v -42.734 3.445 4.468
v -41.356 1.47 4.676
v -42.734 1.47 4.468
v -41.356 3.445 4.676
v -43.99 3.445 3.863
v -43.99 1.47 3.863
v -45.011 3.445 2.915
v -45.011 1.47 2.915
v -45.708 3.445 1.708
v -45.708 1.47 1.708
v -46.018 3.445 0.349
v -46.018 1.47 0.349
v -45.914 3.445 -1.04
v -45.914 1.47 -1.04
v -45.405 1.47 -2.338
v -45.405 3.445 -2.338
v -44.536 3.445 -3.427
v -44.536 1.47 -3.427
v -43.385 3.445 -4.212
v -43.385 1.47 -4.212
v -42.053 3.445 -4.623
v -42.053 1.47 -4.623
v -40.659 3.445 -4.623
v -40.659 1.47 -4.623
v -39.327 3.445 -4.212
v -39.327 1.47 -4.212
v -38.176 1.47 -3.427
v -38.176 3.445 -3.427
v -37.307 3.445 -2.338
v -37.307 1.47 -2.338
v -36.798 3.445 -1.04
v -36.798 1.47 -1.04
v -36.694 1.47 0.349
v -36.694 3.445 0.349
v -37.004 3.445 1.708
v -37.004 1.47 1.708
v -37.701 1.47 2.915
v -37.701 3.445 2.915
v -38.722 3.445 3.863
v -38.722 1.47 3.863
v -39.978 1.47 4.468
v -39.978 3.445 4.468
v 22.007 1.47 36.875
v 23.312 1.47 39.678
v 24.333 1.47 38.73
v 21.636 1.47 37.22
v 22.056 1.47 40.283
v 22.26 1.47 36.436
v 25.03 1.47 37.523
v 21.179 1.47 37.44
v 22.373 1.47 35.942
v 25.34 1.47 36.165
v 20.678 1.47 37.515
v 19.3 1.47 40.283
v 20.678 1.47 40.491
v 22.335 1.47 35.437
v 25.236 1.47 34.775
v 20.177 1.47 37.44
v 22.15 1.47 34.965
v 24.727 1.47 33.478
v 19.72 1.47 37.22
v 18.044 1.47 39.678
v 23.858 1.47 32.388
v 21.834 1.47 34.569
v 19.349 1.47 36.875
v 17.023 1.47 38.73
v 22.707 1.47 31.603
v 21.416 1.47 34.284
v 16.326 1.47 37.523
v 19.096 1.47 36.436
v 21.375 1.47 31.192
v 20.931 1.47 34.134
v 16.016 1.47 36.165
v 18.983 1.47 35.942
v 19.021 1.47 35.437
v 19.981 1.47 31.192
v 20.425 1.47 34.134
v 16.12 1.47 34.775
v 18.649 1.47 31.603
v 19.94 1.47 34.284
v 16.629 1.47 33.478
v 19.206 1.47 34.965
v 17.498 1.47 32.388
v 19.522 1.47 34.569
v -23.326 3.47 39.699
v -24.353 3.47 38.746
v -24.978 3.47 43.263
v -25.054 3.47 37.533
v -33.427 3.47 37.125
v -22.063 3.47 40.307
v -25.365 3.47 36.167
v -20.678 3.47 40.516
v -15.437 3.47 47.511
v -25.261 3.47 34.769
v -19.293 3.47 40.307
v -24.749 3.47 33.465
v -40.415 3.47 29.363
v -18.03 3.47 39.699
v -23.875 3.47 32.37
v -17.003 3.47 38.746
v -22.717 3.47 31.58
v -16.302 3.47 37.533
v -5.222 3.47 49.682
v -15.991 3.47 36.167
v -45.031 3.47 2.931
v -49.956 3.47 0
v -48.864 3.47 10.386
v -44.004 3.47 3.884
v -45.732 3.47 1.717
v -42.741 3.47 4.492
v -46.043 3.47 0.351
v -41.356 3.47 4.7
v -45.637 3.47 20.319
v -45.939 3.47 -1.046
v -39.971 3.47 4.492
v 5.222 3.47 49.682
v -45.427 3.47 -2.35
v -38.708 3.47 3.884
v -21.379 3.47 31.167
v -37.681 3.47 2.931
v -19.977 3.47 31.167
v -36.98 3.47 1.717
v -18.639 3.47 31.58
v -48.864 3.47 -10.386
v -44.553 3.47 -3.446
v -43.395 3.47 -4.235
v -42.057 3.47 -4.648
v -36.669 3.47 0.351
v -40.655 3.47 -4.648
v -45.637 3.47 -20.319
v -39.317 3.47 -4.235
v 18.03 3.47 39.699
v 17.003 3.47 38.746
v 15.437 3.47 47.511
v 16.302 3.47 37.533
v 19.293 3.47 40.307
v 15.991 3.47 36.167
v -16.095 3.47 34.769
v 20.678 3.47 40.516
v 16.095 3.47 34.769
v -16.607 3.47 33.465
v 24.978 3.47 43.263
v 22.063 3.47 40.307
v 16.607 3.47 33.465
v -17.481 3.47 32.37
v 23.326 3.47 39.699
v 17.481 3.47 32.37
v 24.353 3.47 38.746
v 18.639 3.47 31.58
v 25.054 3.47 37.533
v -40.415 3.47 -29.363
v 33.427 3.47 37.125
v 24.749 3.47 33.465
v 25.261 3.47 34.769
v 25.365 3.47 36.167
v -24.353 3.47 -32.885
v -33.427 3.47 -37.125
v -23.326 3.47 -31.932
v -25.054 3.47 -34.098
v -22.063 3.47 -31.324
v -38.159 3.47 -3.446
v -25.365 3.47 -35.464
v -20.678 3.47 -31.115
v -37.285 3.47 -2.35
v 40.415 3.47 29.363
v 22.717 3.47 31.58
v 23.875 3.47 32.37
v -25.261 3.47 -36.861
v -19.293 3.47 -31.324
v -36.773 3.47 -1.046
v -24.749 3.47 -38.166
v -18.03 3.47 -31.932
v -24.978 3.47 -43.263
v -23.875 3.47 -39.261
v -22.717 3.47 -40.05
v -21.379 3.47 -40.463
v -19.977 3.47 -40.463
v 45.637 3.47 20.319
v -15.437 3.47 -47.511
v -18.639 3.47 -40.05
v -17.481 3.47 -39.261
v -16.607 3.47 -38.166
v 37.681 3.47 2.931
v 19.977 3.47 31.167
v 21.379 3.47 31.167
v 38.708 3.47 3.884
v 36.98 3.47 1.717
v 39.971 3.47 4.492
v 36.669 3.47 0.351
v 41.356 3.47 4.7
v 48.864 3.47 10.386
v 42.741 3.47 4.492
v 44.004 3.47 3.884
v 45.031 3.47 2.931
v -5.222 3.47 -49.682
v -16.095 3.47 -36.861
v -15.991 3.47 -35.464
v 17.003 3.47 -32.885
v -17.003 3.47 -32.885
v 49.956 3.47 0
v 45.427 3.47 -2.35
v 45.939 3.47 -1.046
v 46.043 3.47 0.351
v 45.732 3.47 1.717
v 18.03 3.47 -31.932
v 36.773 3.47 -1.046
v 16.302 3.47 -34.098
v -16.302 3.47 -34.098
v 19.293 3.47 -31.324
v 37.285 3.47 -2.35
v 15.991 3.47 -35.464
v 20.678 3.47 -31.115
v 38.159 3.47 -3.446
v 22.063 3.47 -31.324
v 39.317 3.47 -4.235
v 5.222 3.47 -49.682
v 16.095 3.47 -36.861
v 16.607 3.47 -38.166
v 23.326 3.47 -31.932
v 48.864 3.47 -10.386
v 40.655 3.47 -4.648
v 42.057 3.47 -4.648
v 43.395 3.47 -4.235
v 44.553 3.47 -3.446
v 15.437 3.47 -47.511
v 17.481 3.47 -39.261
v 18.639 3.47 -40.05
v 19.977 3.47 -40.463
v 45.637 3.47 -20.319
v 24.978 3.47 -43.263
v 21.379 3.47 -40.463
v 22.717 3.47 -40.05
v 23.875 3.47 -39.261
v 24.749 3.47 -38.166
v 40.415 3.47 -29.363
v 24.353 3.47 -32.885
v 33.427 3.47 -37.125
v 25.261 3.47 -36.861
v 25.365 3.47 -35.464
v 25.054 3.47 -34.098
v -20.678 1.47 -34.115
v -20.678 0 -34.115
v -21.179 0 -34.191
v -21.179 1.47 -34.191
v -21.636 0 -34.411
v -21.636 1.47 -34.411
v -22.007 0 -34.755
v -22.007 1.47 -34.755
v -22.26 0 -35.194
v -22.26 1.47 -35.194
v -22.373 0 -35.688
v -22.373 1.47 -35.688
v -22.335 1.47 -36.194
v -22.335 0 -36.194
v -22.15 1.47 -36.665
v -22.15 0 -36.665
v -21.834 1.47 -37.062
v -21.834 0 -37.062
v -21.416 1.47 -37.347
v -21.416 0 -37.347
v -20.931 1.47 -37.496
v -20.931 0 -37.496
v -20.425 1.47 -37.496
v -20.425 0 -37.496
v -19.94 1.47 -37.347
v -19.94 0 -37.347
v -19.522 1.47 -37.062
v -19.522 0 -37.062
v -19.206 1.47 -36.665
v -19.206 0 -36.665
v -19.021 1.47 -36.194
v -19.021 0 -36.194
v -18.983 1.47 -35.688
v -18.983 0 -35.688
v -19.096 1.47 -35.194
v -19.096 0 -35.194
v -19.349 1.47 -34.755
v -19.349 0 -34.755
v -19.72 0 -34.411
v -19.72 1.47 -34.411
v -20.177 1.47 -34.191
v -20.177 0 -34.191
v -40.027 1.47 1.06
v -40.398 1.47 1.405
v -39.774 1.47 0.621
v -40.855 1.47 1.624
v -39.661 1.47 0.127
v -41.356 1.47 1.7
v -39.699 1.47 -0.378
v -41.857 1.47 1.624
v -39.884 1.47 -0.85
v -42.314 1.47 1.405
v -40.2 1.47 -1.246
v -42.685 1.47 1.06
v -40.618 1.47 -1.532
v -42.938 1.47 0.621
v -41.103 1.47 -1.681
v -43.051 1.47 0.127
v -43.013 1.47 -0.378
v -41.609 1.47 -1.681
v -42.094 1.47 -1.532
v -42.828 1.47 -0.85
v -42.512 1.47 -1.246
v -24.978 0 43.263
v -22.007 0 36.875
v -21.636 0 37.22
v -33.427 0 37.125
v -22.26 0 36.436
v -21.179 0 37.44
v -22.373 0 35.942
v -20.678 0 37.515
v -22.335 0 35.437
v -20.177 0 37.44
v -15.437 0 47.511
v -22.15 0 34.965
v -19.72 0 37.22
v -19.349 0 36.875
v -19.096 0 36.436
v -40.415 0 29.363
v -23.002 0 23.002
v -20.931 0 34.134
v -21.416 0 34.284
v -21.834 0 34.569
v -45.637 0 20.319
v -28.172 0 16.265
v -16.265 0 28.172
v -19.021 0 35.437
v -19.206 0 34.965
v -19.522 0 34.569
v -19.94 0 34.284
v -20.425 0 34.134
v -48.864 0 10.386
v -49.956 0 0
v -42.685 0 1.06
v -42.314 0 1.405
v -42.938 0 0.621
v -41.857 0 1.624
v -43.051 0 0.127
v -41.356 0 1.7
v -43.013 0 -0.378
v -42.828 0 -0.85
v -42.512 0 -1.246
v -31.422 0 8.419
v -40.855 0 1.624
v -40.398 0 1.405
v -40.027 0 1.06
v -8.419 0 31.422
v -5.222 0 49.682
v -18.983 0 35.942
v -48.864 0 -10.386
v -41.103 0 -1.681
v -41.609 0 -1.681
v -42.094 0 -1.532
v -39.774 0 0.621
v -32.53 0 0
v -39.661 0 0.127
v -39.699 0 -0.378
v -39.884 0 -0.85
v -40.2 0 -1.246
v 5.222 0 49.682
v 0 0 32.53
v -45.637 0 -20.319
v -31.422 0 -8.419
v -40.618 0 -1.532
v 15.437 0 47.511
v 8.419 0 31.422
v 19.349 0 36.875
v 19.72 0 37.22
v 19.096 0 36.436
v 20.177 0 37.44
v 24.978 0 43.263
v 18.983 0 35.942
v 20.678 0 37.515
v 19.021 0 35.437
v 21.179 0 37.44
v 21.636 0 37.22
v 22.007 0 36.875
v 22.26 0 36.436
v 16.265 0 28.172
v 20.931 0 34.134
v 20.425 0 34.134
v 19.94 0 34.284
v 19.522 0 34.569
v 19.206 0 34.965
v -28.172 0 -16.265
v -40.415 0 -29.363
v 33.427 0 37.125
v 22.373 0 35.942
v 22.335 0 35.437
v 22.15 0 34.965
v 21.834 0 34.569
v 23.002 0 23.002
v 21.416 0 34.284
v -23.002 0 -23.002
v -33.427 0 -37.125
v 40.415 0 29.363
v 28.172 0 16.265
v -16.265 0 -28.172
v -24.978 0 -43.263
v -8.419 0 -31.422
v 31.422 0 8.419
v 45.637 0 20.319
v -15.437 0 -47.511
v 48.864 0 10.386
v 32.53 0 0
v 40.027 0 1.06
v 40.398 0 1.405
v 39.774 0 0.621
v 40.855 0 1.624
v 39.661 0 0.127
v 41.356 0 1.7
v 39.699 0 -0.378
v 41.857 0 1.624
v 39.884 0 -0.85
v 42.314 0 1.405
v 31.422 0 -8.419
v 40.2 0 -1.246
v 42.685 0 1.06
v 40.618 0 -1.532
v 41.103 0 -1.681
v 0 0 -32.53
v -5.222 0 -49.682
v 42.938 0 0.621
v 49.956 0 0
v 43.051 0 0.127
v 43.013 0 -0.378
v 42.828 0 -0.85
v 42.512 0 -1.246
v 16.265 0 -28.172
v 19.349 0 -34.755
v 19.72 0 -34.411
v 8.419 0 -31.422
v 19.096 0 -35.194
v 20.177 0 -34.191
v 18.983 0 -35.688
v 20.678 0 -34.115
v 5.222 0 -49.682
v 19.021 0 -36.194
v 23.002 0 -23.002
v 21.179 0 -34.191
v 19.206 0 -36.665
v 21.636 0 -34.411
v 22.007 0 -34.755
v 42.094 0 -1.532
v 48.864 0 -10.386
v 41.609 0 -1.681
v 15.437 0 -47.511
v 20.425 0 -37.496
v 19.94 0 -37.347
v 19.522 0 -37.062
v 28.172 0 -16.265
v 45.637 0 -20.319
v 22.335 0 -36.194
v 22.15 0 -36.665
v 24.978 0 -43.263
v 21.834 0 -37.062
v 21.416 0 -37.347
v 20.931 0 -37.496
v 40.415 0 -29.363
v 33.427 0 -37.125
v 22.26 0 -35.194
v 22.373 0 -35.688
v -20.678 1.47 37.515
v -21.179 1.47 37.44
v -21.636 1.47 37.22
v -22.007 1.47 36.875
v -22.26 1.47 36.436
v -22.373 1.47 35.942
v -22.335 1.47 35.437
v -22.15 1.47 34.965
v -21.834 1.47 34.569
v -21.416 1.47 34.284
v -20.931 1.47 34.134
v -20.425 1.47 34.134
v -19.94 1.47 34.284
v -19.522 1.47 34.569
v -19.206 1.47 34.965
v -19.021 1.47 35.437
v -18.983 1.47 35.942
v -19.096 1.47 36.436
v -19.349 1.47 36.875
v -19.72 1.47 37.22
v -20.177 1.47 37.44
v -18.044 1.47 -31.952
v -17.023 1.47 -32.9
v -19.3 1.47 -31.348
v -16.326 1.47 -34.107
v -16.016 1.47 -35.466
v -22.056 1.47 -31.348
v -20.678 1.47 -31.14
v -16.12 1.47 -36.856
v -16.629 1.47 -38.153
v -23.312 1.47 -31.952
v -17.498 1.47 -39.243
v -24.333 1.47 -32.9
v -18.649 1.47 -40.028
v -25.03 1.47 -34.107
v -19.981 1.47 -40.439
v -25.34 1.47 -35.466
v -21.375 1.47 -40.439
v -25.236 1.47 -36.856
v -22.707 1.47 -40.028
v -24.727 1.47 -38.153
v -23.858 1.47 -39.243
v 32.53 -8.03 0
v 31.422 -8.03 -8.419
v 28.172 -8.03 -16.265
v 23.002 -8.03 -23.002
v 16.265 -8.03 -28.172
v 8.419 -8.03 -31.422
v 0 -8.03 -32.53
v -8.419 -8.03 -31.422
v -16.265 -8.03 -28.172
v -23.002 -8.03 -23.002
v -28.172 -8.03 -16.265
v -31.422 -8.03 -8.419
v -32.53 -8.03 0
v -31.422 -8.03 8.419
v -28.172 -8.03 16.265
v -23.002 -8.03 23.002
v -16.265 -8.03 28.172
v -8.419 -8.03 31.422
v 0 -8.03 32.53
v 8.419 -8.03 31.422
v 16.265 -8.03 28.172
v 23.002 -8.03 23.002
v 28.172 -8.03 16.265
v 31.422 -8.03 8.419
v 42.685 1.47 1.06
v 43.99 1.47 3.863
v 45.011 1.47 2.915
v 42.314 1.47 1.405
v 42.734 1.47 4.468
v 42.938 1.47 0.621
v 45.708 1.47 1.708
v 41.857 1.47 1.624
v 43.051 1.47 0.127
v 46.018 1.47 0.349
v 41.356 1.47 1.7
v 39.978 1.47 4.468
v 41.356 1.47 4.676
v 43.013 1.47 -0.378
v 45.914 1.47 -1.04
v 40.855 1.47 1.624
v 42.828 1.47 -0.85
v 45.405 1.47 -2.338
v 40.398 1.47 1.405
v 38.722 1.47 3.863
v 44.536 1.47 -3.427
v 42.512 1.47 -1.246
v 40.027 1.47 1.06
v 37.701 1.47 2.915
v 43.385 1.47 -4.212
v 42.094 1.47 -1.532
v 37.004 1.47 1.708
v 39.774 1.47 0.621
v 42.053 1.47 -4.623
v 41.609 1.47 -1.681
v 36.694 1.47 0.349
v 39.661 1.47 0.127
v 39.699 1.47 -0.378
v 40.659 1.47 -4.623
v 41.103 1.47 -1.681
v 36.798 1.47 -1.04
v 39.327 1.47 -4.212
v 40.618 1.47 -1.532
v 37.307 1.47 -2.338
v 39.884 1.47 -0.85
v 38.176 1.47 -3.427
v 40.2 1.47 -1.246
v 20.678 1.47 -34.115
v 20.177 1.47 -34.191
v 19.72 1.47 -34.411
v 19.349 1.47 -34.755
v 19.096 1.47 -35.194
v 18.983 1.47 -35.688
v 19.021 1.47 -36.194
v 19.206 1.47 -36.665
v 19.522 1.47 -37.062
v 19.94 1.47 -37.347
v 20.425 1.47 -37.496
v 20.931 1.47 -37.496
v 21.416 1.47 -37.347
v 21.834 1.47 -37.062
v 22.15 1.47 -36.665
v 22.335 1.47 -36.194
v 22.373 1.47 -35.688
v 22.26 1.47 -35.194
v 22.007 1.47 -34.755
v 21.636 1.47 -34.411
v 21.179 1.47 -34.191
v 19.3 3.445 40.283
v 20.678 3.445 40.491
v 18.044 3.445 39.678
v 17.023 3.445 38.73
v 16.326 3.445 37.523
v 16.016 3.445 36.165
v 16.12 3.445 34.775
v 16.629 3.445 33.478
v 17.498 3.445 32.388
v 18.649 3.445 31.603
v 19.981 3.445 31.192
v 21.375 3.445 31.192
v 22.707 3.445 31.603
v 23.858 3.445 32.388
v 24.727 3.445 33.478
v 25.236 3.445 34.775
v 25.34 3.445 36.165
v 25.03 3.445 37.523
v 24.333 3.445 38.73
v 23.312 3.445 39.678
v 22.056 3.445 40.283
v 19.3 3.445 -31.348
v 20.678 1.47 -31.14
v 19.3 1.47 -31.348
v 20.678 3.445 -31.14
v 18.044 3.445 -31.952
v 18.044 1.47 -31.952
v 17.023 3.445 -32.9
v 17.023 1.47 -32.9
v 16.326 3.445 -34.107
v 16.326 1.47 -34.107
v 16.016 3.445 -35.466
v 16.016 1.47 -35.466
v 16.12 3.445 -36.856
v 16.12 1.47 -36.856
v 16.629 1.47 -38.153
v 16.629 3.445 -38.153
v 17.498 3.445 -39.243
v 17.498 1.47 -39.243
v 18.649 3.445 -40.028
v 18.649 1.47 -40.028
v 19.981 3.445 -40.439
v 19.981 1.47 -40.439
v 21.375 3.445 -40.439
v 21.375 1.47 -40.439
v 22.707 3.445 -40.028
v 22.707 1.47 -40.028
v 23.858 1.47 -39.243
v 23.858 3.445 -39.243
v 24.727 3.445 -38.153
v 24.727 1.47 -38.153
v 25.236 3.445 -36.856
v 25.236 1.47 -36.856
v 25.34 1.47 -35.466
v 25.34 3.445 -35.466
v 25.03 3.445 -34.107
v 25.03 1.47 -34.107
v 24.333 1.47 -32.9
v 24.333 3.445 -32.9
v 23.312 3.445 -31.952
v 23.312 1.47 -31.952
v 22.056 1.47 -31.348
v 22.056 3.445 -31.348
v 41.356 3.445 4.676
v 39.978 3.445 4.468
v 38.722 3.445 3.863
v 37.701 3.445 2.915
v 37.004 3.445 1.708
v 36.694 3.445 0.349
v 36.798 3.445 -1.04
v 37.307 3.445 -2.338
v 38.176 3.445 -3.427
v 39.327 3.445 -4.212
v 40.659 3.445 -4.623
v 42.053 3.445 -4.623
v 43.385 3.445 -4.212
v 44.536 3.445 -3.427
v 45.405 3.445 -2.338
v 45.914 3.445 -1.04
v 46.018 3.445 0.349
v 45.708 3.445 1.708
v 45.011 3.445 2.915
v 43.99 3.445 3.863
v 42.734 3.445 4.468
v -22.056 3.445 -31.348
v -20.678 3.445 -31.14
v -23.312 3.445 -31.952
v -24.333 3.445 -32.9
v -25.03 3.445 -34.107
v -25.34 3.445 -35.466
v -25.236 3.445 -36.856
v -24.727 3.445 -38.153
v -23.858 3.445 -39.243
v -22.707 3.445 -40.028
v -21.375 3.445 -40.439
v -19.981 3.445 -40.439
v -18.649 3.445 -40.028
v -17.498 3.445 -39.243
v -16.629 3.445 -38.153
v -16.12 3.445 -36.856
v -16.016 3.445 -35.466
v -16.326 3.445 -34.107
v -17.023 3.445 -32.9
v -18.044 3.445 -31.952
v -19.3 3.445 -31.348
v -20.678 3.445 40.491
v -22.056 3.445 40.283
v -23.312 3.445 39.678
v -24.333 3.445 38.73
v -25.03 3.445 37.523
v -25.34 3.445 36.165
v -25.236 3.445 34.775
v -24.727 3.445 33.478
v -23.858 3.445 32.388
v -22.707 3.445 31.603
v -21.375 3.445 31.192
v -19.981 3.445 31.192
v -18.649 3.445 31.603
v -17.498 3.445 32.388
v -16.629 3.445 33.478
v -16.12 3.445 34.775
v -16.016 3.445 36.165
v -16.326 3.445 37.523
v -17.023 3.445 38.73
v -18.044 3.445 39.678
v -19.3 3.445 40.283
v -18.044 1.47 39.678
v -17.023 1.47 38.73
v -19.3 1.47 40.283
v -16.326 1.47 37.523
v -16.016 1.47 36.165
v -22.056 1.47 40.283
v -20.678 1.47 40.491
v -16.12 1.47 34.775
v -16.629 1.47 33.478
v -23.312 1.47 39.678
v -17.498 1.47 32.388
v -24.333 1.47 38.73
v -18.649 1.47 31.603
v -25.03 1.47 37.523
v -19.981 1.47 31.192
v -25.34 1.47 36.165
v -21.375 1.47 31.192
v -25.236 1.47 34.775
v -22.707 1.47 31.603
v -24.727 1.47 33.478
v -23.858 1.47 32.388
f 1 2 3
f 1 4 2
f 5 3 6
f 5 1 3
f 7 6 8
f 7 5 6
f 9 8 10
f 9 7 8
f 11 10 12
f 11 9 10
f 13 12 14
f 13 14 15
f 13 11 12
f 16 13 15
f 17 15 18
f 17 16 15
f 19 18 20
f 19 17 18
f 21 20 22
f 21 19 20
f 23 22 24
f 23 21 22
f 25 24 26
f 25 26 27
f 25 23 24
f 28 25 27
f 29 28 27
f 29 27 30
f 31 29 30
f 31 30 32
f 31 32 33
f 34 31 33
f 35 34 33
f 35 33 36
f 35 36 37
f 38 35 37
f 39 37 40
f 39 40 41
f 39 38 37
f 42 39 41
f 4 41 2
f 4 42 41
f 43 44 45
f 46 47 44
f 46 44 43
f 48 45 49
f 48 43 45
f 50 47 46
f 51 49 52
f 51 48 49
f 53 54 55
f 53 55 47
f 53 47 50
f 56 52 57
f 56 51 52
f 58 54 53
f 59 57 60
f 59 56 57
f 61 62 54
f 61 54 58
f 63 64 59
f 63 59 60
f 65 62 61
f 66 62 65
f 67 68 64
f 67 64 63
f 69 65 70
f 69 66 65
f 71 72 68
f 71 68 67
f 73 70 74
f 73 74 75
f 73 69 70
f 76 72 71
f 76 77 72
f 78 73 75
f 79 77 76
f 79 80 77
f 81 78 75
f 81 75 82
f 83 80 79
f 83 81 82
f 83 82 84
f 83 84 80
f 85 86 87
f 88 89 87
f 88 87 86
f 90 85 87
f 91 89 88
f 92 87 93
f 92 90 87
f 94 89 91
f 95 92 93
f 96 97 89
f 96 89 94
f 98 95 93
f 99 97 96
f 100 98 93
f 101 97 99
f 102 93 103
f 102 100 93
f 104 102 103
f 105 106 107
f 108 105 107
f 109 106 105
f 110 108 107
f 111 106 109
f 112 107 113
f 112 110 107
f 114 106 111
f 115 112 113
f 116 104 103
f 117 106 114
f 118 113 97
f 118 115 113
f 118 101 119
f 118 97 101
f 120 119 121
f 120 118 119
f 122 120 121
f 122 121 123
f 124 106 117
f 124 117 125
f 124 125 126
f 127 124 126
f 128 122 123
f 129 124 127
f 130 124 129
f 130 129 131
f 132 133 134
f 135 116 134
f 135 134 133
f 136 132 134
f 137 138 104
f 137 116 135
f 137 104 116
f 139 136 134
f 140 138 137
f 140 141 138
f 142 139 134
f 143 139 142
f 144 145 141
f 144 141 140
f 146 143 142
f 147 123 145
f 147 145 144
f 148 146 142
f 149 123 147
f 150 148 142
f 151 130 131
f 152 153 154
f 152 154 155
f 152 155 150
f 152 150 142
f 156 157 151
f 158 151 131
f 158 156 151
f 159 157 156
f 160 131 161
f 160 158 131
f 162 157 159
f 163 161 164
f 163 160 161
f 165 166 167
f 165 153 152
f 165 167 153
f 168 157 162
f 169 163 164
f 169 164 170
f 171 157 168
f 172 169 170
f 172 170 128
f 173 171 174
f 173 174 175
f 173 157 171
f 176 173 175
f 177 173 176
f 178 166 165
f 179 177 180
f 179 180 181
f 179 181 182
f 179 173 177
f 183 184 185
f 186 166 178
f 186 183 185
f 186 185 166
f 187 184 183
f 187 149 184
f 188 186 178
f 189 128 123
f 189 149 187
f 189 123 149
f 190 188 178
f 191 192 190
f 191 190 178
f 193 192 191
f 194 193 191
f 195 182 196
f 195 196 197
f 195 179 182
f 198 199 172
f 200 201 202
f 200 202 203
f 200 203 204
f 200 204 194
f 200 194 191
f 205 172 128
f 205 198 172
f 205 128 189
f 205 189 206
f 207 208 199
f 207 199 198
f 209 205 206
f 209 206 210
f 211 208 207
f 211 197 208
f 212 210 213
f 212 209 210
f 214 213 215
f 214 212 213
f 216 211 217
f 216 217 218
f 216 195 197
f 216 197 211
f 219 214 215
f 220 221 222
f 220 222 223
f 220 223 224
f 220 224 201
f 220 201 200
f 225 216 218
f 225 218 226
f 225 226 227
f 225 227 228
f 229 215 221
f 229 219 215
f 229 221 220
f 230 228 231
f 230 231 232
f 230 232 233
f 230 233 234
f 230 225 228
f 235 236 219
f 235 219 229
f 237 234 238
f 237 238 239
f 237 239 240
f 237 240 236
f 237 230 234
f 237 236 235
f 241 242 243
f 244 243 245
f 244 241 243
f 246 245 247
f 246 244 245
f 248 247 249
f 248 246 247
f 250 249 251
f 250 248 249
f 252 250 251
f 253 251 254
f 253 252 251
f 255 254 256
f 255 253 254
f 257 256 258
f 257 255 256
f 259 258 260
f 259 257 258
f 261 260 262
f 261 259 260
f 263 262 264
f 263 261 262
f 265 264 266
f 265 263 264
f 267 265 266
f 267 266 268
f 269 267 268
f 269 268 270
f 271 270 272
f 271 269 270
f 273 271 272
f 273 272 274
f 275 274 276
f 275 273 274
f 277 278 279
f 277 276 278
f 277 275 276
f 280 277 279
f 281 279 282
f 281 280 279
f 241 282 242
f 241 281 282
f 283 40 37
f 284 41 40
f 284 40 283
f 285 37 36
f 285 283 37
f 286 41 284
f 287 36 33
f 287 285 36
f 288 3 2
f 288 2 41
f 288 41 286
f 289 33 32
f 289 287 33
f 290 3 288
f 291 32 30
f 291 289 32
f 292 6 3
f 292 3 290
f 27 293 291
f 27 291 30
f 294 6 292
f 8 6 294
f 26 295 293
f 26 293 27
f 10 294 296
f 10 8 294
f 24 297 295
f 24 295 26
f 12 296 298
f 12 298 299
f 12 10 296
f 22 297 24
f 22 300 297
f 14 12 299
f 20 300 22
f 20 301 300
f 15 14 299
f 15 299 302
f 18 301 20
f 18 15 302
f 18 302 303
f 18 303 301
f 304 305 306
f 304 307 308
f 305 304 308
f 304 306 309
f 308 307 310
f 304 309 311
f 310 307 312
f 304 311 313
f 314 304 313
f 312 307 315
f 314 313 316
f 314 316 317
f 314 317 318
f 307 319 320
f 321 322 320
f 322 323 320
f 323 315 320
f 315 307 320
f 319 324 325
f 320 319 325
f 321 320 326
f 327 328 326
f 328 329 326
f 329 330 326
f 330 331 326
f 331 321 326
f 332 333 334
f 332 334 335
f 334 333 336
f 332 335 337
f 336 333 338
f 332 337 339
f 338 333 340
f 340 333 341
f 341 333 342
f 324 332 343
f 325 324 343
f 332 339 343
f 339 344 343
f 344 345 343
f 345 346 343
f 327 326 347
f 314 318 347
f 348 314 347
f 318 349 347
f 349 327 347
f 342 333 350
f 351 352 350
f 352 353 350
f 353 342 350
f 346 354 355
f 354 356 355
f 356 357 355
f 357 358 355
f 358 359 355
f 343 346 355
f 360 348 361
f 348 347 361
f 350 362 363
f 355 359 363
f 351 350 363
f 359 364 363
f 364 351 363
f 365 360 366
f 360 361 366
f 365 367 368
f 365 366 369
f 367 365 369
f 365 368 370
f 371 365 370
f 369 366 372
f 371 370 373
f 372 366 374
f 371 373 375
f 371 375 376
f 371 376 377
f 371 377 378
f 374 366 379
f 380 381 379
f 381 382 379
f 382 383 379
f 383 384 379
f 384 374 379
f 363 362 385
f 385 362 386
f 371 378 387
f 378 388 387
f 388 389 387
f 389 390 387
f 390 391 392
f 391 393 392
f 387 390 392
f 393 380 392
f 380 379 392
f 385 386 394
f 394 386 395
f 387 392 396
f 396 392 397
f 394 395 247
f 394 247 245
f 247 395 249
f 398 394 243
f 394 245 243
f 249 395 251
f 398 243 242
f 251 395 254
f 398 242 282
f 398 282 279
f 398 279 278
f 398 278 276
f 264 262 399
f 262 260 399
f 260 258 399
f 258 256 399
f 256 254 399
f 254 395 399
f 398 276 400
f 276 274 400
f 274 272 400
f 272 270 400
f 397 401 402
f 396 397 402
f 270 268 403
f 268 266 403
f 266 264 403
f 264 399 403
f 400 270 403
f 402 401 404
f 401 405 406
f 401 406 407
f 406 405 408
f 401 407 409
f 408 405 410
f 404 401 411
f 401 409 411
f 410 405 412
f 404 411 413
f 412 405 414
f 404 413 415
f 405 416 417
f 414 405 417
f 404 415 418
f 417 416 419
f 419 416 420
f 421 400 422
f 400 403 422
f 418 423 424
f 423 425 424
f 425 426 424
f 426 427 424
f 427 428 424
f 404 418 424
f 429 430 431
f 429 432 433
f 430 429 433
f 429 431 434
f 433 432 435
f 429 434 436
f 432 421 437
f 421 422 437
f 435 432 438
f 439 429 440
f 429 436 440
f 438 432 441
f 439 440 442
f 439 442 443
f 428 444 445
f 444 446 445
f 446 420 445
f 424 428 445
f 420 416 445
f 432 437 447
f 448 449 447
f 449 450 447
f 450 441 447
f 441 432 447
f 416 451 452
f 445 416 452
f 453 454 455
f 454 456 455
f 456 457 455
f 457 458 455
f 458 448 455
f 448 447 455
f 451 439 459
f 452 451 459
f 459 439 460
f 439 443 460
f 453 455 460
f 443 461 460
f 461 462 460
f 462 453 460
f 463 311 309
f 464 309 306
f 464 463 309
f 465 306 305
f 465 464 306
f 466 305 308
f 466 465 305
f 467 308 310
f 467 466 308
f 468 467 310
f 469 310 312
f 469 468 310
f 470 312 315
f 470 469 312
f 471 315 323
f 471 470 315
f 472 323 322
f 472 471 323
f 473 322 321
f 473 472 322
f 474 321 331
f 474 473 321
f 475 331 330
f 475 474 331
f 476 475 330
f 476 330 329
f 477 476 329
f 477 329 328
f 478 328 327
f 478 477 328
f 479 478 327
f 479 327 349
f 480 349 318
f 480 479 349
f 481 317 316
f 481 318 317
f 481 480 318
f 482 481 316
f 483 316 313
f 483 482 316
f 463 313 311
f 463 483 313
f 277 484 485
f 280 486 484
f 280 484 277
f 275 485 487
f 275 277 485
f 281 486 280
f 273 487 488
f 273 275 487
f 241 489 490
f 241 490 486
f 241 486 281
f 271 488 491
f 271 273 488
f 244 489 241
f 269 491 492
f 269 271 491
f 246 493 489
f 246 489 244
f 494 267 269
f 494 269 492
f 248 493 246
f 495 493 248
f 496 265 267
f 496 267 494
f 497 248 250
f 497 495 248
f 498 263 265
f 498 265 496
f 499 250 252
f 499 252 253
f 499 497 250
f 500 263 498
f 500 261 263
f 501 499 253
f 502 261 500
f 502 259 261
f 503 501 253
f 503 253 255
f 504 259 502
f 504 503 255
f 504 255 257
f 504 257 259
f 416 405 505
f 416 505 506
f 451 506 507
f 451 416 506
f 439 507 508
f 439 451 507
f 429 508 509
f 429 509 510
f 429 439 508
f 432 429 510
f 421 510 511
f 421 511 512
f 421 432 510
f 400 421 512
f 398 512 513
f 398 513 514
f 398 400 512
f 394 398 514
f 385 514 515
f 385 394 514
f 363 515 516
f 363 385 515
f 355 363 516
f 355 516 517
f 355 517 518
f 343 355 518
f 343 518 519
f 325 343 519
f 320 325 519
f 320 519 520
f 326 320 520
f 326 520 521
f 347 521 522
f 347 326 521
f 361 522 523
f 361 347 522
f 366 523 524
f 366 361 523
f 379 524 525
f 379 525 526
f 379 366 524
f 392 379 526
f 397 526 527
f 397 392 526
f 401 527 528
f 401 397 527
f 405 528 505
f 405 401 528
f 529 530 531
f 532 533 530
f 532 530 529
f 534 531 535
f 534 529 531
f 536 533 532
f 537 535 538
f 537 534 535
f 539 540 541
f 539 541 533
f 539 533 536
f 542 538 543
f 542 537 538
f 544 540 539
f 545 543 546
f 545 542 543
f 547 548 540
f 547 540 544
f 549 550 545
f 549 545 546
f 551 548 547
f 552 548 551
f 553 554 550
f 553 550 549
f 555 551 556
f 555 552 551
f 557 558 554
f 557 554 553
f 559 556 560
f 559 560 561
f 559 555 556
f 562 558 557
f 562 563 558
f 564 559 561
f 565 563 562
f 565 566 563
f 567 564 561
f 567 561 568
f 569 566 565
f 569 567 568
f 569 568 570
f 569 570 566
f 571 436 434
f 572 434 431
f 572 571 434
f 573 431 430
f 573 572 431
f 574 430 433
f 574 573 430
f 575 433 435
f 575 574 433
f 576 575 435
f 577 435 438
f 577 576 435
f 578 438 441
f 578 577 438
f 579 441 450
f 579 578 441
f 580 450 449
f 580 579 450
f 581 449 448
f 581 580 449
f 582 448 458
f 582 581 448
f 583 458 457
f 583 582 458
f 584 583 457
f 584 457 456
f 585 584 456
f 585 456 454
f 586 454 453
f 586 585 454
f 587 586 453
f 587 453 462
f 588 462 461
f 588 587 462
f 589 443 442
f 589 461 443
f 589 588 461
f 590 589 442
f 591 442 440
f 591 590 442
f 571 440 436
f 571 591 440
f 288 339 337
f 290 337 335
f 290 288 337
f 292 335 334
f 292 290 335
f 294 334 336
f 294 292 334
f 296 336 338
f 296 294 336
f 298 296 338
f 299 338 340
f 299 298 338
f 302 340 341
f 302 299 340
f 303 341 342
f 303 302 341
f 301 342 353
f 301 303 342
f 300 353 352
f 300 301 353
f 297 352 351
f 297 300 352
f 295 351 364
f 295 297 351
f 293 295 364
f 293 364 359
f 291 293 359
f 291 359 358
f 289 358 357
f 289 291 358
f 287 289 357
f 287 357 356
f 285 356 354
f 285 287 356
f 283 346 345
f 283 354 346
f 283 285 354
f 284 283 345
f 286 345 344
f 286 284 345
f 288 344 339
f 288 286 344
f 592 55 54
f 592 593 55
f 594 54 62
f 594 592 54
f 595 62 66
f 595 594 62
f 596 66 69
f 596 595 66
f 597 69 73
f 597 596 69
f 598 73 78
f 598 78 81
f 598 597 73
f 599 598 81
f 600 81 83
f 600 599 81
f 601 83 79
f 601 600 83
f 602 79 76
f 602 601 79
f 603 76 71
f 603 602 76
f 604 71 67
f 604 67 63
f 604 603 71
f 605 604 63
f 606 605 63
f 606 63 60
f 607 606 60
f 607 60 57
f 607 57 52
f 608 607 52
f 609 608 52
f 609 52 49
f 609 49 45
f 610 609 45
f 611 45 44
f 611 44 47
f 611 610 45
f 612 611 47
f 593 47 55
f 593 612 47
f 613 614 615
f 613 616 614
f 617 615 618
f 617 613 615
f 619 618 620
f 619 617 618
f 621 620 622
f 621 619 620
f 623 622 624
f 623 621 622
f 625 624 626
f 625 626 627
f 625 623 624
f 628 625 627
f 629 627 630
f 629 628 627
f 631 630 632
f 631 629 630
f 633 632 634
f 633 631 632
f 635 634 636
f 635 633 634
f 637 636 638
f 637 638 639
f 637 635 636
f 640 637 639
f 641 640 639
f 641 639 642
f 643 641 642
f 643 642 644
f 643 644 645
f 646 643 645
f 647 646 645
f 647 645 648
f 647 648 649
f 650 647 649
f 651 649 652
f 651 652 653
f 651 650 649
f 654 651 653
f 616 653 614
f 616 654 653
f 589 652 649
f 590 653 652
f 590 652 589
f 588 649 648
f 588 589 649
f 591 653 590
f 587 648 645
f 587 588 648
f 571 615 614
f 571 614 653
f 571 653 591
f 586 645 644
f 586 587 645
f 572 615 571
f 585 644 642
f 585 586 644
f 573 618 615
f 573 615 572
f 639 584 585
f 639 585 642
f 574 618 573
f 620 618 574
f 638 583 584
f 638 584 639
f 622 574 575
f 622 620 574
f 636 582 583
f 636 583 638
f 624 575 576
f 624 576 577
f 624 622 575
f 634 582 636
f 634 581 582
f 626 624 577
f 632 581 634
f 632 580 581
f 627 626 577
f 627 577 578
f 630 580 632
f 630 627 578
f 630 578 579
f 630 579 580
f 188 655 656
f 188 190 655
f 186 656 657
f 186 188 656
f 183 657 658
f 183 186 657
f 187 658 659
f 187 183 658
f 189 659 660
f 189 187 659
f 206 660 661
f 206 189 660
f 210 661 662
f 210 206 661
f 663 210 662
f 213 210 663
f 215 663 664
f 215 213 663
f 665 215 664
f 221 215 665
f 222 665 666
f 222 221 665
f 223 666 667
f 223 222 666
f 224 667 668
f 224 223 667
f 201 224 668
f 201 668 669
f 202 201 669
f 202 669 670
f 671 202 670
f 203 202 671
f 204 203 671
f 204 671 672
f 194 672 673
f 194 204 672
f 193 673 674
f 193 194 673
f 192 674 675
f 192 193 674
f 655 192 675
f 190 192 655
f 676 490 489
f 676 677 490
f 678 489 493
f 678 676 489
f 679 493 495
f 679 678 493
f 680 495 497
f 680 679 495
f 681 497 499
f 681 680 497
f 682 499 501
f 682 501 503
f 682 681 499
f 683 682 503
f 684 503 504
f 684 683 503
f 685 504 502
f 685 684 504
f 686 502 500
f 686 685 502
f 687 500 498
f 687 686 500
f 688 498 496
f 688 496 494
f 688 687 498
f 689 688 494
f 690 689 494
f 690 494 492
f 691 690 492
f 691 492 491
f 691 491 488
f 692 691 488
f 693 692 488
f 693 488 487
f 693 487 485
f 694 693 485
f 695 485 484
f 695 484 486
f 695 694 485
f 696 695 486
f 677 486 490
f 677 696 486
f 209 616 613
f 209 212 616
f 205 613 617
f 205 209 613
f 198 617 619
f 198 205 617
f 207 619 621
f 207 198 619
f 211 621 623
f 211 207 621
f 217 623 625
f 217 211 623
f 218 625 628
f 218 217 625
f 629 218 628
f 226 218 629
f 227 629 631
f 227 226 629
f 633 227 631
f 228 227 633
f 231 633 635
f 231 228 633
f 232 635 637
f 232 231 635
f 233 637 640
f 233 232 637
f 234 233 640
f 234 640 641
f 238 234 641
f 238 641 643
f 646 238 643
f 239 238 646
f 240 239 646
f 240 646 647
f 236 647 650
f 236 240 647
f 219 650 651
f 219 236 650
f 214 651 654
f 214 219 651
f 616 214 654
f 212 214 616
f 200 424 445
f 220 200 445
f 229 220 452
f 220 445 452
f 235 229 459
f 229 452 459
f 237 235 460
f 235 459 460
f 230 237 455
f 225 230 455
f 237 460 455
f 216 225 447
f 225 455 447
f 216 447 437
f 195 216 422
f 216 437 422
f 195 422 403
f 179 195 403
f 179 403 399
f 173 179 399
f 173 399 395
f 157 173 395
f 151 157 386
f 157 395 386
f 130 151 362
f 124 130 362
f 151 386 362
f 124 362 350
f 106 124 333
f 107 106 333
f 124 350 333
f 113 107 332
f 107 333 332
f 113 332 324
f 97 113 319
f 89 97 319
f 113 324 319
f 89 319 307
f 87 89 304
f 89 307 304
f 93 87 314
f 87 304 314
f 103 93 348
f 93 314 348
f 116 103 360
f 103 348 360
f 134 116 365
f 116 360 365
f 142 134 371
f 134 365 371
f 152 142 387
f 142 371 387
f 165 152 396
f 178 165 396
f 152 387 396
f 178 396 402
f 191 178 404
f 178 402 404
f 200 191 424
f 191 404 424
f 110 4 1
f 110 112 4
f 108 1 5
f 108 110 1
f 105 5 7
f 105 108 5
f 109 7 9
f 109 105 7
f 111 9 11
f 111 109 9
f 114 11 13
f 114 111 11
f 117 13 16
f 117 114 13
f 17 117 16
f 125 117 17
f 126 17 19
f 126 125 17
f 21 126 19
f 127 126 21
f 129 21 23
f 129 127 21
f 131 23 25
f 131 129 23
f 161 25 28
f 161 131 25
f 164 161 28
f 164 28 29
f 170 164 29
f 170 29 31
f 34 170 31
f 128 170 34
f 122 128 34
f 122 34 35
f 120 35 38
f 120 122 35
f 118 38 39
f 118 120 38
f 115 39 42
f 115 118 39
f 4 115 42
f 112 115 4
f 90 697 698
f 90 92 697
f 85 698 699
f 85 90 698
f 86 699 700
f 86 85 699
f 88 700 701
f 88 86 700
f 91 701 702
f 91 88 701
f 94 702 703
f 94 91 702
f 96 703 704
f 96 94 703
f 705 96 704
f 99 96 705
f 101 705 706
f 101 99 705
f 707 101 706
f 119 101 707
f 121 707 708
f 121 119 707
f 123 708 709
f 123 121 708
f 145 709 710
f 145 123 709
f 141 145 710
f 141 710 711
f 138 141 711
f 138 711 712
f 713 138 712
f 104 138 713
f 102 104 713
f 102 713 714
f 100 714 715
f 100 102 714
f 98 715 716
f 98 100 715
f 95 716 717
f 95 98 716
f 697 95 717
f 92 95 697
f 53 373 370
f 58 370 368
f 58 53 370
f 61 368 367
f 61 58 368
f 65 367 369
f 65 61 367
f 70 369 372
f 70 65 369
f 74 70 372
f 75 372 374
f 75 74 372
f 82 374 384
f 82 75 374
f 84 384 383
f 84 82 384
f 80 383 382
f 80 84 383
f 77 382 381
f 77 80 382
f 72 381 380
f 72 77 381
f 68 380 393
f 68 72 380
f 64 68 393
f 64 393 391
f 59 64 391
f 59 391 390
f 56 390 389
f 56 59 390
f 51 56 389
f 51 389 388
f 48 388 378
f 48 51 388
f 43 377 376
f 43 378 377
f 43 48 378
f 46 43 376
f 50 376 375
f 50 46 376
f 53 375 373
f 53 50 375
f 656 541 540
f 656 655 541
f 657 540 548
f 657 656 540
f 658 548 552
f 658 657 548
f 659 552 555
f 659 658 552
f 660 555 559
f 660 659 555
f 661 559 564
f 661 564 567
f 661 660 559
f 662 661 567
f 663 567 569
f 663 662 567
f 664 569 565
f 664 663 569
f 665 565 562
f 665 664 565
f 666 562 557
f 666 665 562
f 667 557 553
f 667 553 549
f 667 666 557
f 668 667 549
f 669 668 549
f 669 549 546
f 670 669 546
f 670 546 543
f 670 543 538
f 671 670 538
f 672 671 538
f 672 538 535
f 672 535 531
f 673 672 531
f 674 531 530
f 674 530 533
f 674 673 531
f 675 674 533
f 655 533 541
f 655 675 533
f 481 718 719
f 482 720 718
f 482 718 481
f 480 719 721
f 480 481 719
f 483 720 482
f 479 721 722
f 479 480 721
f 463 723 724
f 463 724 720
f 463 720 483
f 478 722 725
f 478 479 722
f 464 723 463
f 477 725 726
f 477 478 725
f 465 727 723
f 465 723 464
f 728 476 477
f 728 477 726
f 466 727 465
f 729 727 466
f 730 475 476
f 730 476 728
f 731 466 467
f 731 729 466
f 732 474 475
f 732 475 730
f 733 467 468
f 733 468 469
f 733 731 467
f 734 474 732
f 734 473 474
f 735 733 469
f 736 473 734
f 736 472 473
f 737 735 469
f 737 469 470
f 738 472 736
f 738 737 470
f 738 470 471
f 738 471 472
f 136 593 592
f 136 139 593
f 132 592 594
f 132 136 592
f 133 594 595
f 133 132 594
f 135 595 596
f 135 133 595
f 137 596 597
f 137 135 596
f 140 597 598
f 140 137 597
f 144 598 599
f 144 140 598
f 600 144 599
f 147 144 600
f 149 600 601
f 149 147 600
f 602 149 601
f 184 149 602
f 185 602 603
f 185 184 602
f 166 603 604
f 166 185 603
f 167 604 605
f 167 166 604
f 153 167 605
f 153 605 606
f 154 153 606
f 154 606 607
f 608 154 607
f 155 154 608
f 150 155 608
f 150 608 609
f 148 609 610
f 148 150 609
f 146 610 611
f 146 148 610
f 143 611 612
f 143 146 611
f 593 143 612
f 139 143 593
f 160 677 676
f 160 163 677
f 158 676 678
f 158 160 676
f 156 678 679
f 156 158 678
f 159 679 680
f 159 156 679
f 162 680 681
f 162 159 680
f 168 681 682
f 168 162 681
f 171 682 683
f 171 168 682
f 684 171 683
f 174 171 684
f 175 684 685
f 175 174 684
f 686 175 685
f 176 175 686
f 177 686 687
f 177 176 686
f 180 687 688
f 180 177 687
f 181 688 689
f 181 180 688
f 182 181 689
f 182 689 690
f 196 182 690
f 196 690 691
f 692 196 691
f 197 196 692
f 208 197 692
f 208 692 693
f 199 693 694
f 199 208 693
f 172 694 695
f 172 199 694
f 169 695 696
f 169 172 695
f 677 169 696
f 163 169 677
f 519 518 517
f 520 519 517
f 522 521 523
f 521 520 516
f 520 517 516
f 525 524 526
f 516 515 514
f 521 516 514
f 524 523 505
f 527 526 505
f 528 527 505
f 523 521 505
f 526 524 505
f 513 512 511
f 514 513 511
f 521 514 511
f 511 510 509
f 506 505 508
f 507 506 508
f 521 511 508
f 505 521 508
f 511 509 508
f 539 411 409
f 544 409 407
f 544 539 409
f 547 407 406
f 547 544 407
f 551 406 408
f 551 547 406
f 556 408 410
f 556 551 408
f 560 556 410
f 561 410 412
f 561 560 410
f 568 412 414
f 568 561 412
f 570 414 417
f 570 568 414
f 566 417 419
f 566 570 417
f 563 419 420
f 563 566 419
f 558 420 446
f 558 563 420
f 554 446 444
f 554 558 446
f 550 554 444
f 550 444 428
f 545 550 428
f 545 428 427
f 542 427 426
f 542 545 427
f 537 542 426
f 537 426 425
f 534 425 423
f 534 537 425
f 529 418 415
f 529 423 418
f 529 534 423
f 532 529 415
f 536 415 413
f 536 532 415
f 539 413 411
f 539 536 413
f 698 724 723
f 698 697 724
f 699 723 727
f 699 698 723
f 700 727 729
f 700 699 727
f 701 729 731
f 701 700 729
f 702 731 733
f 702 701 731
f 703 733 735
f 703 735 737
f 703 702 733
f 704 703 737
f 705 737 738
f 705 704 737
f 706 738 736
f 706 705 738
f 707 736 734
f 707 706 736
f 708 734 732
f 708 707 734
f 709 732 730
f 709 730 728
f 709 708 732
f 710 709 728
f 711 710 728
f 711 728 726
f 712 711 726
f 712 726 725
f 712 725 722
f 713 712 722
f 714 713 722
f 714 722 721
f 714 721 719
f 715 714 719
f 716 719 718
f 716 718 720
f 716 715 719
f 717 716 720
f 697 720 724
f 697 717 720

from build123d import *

# Parameters (mm, degrees)
ESQUISSE1_R                                = 32.53
BOSS_EXTRU_1_DEPTH                         = 8.03
ESQUISSE2_R                                = 49.956
BOSS_EXTRU_2_DEPTH                         = 3.47
CHAMBRAGE_POUR_VIS_T_TE_HEXAGONALE_2_COUNT = 2
CHAMBRAGE_POUR_VIS_T_TE_HEXAGONALE_2_PITCH = 41.356
CHAMBRAGE_POUR_VIS_T_TE_HEXAGONALE_3_COUNT = 2
CHAMBRAGE_POUR_VIS_T_TE_HEXAGONALE_3_PITCH = 71.630693198
CHAMBRAGE_POUR_VIS_T_TE_HEXAGONALE_4_COUNT = 2
CHAMBRAGE_POUR_VIS_T_TE_HEXAGONALE_4_PITCH = 82.712
CHAMBRAGE_POUR_VIS_T_TE_HEXAGONALE_5_COUNT = 2
CHAMBRAGE_POUR_VIS_T_TE_HEXAGONALE_5_PITCH = 71.630693198
CHAMBRAGE_POUR_VIS_T_TE_HEXAGONALE_6_COUNT = 2
CHAMBRAGE_POUR_VIS_T_TE_HEXAGONALE_6_PITCH = 41.356


with BuildPart() as part:
    # Esquisse1 → Boss.-Extru.1 (new body)
    with BuildSketch(Plane(origin=(0, 0, 0), x_dir=(1, 0, 0), z_dir=(0, 1, 0))):
        Circle(ESQUISSE1_R)
    extrude(amount=-BOSS_EXTRU_1_DEPTH)

    # Esquisse2 → Boss.-Extru.2 (add)
    with BuildSketch(Plane(origin=(0, 0, 0), x_dir=(1, 0, 0), z_dir=(0, 1, 0))):
        Circle(ESQUISSE2_R)
    extrude(amount=BOSS_EXTRU_2_DEPTH)

    # Esquisse6 → Chambrage pour vis à tête hexagonale M33 (revolve, cut)
    with BuildSketch(Plane(origin=(-41.356, 3.47, 0), x_dir=(0, 0, 1), z_dir=(1, 0, 0))):
        Polygon((0, 0), (0, 11.5), (1.7, 11.5), (1.7, 2), (4.6755, 2), (4.6755, 0.025), (4.7005, 0), align=None)
    chambrage_pour_vis_t_te_hexagonale_m33 = revolve(axis=Axis((-41.356, 9.82, 0), (0, -1, 0)), mode=Mode.SUBTRACT)

    # Chambrage pour vis _ t_te hexagonale 2: Chambrage pour vis à tête hexagonale M33 ×2
    with Locations(*[Vector(0.5, 0, -0.866025404) * (i * CHAMBRAGE_POUR_VIS_T_TE_HEXAGONALE_2_PITCH) for i in range(1, CHAMBRAGE_POUR_VIS_T_TE_HEXAGONALE_2_COUNT)]):
        add(chambrage_pour_vis_t_te_hexagonale_m33, mode=Mode.SUBTRACT)

    # Chambrage pour vis _ t_te hexagonale 3: Chambrage pour vis à tête hexagonale M33 ×2
    with Locations(*[Vector(0.866025404, 0, -0.5) * (i * CHAMBRAGE_POUR_VIS_T_TE_HEXAGONALE_3_PITCH) for i in range(1, CHAMBRAGE_POUR_VIS_T_TE_HEXAGONALE_3_COUNT)]):
        add(chambrage_pour_vis_t_te_hexagonale_m33, mode=Mode.SUBTRACT)

    # Chambrage pour vis _ t_te hexagonale 4: Chambrage pour vis à tête hexagonale M33 ×2
    with Locations(*[(i * CHAMBRAGE_POUR_VIS_T_TE_HEXAGONALE_4_PITCH, 0, 0) for i in range(1, CHAMBRAGE_POUR_VIS_T_TE_HEXAGONALE_4_COUNT)]):
        add(chambrage_pour_vis_t_te_hexagonale_m33, mode=Mode.SUBTRACT)

    # Chambrage pour vis _ t_te hexagonale 5: Chambrage pour vis à tête hexagonale M33 ×2
    with Locations(*[Vector(0.866025404, 0, 0.5) * (i * CHAMBRAGE_POUR_VIS_T_TE_HEXAGONALE_5_PITCH) for i in range(1, CHAMBRAGE_POUR_VIS_T_TE_HEXAGONALE_5_COUNT)]):
        add(chambrage_pour_vis_t_te_hexagonale_m33, mode=Mode.SUBTRACT)

    # Chambrage pour vis _ t_te hexagonale 6: Chambrage pour vis à tête hexagonale M33 ×2
    with Locations(*[Vector(0.5, 0, 0.866025404) * (i * CHAMBRAGE_POUR_VIS_T_TE_HEXAGONALE_6_PITCH) for i in range(1, CHAMBRAGE_POUR_VIS_T_TE_HEXAGONALE_6_COUNT)]):
        add(chambrage_pour_vis_t_te_hexagonale_m33, mode=Mode.SUBTRACT)


solid = part.part
